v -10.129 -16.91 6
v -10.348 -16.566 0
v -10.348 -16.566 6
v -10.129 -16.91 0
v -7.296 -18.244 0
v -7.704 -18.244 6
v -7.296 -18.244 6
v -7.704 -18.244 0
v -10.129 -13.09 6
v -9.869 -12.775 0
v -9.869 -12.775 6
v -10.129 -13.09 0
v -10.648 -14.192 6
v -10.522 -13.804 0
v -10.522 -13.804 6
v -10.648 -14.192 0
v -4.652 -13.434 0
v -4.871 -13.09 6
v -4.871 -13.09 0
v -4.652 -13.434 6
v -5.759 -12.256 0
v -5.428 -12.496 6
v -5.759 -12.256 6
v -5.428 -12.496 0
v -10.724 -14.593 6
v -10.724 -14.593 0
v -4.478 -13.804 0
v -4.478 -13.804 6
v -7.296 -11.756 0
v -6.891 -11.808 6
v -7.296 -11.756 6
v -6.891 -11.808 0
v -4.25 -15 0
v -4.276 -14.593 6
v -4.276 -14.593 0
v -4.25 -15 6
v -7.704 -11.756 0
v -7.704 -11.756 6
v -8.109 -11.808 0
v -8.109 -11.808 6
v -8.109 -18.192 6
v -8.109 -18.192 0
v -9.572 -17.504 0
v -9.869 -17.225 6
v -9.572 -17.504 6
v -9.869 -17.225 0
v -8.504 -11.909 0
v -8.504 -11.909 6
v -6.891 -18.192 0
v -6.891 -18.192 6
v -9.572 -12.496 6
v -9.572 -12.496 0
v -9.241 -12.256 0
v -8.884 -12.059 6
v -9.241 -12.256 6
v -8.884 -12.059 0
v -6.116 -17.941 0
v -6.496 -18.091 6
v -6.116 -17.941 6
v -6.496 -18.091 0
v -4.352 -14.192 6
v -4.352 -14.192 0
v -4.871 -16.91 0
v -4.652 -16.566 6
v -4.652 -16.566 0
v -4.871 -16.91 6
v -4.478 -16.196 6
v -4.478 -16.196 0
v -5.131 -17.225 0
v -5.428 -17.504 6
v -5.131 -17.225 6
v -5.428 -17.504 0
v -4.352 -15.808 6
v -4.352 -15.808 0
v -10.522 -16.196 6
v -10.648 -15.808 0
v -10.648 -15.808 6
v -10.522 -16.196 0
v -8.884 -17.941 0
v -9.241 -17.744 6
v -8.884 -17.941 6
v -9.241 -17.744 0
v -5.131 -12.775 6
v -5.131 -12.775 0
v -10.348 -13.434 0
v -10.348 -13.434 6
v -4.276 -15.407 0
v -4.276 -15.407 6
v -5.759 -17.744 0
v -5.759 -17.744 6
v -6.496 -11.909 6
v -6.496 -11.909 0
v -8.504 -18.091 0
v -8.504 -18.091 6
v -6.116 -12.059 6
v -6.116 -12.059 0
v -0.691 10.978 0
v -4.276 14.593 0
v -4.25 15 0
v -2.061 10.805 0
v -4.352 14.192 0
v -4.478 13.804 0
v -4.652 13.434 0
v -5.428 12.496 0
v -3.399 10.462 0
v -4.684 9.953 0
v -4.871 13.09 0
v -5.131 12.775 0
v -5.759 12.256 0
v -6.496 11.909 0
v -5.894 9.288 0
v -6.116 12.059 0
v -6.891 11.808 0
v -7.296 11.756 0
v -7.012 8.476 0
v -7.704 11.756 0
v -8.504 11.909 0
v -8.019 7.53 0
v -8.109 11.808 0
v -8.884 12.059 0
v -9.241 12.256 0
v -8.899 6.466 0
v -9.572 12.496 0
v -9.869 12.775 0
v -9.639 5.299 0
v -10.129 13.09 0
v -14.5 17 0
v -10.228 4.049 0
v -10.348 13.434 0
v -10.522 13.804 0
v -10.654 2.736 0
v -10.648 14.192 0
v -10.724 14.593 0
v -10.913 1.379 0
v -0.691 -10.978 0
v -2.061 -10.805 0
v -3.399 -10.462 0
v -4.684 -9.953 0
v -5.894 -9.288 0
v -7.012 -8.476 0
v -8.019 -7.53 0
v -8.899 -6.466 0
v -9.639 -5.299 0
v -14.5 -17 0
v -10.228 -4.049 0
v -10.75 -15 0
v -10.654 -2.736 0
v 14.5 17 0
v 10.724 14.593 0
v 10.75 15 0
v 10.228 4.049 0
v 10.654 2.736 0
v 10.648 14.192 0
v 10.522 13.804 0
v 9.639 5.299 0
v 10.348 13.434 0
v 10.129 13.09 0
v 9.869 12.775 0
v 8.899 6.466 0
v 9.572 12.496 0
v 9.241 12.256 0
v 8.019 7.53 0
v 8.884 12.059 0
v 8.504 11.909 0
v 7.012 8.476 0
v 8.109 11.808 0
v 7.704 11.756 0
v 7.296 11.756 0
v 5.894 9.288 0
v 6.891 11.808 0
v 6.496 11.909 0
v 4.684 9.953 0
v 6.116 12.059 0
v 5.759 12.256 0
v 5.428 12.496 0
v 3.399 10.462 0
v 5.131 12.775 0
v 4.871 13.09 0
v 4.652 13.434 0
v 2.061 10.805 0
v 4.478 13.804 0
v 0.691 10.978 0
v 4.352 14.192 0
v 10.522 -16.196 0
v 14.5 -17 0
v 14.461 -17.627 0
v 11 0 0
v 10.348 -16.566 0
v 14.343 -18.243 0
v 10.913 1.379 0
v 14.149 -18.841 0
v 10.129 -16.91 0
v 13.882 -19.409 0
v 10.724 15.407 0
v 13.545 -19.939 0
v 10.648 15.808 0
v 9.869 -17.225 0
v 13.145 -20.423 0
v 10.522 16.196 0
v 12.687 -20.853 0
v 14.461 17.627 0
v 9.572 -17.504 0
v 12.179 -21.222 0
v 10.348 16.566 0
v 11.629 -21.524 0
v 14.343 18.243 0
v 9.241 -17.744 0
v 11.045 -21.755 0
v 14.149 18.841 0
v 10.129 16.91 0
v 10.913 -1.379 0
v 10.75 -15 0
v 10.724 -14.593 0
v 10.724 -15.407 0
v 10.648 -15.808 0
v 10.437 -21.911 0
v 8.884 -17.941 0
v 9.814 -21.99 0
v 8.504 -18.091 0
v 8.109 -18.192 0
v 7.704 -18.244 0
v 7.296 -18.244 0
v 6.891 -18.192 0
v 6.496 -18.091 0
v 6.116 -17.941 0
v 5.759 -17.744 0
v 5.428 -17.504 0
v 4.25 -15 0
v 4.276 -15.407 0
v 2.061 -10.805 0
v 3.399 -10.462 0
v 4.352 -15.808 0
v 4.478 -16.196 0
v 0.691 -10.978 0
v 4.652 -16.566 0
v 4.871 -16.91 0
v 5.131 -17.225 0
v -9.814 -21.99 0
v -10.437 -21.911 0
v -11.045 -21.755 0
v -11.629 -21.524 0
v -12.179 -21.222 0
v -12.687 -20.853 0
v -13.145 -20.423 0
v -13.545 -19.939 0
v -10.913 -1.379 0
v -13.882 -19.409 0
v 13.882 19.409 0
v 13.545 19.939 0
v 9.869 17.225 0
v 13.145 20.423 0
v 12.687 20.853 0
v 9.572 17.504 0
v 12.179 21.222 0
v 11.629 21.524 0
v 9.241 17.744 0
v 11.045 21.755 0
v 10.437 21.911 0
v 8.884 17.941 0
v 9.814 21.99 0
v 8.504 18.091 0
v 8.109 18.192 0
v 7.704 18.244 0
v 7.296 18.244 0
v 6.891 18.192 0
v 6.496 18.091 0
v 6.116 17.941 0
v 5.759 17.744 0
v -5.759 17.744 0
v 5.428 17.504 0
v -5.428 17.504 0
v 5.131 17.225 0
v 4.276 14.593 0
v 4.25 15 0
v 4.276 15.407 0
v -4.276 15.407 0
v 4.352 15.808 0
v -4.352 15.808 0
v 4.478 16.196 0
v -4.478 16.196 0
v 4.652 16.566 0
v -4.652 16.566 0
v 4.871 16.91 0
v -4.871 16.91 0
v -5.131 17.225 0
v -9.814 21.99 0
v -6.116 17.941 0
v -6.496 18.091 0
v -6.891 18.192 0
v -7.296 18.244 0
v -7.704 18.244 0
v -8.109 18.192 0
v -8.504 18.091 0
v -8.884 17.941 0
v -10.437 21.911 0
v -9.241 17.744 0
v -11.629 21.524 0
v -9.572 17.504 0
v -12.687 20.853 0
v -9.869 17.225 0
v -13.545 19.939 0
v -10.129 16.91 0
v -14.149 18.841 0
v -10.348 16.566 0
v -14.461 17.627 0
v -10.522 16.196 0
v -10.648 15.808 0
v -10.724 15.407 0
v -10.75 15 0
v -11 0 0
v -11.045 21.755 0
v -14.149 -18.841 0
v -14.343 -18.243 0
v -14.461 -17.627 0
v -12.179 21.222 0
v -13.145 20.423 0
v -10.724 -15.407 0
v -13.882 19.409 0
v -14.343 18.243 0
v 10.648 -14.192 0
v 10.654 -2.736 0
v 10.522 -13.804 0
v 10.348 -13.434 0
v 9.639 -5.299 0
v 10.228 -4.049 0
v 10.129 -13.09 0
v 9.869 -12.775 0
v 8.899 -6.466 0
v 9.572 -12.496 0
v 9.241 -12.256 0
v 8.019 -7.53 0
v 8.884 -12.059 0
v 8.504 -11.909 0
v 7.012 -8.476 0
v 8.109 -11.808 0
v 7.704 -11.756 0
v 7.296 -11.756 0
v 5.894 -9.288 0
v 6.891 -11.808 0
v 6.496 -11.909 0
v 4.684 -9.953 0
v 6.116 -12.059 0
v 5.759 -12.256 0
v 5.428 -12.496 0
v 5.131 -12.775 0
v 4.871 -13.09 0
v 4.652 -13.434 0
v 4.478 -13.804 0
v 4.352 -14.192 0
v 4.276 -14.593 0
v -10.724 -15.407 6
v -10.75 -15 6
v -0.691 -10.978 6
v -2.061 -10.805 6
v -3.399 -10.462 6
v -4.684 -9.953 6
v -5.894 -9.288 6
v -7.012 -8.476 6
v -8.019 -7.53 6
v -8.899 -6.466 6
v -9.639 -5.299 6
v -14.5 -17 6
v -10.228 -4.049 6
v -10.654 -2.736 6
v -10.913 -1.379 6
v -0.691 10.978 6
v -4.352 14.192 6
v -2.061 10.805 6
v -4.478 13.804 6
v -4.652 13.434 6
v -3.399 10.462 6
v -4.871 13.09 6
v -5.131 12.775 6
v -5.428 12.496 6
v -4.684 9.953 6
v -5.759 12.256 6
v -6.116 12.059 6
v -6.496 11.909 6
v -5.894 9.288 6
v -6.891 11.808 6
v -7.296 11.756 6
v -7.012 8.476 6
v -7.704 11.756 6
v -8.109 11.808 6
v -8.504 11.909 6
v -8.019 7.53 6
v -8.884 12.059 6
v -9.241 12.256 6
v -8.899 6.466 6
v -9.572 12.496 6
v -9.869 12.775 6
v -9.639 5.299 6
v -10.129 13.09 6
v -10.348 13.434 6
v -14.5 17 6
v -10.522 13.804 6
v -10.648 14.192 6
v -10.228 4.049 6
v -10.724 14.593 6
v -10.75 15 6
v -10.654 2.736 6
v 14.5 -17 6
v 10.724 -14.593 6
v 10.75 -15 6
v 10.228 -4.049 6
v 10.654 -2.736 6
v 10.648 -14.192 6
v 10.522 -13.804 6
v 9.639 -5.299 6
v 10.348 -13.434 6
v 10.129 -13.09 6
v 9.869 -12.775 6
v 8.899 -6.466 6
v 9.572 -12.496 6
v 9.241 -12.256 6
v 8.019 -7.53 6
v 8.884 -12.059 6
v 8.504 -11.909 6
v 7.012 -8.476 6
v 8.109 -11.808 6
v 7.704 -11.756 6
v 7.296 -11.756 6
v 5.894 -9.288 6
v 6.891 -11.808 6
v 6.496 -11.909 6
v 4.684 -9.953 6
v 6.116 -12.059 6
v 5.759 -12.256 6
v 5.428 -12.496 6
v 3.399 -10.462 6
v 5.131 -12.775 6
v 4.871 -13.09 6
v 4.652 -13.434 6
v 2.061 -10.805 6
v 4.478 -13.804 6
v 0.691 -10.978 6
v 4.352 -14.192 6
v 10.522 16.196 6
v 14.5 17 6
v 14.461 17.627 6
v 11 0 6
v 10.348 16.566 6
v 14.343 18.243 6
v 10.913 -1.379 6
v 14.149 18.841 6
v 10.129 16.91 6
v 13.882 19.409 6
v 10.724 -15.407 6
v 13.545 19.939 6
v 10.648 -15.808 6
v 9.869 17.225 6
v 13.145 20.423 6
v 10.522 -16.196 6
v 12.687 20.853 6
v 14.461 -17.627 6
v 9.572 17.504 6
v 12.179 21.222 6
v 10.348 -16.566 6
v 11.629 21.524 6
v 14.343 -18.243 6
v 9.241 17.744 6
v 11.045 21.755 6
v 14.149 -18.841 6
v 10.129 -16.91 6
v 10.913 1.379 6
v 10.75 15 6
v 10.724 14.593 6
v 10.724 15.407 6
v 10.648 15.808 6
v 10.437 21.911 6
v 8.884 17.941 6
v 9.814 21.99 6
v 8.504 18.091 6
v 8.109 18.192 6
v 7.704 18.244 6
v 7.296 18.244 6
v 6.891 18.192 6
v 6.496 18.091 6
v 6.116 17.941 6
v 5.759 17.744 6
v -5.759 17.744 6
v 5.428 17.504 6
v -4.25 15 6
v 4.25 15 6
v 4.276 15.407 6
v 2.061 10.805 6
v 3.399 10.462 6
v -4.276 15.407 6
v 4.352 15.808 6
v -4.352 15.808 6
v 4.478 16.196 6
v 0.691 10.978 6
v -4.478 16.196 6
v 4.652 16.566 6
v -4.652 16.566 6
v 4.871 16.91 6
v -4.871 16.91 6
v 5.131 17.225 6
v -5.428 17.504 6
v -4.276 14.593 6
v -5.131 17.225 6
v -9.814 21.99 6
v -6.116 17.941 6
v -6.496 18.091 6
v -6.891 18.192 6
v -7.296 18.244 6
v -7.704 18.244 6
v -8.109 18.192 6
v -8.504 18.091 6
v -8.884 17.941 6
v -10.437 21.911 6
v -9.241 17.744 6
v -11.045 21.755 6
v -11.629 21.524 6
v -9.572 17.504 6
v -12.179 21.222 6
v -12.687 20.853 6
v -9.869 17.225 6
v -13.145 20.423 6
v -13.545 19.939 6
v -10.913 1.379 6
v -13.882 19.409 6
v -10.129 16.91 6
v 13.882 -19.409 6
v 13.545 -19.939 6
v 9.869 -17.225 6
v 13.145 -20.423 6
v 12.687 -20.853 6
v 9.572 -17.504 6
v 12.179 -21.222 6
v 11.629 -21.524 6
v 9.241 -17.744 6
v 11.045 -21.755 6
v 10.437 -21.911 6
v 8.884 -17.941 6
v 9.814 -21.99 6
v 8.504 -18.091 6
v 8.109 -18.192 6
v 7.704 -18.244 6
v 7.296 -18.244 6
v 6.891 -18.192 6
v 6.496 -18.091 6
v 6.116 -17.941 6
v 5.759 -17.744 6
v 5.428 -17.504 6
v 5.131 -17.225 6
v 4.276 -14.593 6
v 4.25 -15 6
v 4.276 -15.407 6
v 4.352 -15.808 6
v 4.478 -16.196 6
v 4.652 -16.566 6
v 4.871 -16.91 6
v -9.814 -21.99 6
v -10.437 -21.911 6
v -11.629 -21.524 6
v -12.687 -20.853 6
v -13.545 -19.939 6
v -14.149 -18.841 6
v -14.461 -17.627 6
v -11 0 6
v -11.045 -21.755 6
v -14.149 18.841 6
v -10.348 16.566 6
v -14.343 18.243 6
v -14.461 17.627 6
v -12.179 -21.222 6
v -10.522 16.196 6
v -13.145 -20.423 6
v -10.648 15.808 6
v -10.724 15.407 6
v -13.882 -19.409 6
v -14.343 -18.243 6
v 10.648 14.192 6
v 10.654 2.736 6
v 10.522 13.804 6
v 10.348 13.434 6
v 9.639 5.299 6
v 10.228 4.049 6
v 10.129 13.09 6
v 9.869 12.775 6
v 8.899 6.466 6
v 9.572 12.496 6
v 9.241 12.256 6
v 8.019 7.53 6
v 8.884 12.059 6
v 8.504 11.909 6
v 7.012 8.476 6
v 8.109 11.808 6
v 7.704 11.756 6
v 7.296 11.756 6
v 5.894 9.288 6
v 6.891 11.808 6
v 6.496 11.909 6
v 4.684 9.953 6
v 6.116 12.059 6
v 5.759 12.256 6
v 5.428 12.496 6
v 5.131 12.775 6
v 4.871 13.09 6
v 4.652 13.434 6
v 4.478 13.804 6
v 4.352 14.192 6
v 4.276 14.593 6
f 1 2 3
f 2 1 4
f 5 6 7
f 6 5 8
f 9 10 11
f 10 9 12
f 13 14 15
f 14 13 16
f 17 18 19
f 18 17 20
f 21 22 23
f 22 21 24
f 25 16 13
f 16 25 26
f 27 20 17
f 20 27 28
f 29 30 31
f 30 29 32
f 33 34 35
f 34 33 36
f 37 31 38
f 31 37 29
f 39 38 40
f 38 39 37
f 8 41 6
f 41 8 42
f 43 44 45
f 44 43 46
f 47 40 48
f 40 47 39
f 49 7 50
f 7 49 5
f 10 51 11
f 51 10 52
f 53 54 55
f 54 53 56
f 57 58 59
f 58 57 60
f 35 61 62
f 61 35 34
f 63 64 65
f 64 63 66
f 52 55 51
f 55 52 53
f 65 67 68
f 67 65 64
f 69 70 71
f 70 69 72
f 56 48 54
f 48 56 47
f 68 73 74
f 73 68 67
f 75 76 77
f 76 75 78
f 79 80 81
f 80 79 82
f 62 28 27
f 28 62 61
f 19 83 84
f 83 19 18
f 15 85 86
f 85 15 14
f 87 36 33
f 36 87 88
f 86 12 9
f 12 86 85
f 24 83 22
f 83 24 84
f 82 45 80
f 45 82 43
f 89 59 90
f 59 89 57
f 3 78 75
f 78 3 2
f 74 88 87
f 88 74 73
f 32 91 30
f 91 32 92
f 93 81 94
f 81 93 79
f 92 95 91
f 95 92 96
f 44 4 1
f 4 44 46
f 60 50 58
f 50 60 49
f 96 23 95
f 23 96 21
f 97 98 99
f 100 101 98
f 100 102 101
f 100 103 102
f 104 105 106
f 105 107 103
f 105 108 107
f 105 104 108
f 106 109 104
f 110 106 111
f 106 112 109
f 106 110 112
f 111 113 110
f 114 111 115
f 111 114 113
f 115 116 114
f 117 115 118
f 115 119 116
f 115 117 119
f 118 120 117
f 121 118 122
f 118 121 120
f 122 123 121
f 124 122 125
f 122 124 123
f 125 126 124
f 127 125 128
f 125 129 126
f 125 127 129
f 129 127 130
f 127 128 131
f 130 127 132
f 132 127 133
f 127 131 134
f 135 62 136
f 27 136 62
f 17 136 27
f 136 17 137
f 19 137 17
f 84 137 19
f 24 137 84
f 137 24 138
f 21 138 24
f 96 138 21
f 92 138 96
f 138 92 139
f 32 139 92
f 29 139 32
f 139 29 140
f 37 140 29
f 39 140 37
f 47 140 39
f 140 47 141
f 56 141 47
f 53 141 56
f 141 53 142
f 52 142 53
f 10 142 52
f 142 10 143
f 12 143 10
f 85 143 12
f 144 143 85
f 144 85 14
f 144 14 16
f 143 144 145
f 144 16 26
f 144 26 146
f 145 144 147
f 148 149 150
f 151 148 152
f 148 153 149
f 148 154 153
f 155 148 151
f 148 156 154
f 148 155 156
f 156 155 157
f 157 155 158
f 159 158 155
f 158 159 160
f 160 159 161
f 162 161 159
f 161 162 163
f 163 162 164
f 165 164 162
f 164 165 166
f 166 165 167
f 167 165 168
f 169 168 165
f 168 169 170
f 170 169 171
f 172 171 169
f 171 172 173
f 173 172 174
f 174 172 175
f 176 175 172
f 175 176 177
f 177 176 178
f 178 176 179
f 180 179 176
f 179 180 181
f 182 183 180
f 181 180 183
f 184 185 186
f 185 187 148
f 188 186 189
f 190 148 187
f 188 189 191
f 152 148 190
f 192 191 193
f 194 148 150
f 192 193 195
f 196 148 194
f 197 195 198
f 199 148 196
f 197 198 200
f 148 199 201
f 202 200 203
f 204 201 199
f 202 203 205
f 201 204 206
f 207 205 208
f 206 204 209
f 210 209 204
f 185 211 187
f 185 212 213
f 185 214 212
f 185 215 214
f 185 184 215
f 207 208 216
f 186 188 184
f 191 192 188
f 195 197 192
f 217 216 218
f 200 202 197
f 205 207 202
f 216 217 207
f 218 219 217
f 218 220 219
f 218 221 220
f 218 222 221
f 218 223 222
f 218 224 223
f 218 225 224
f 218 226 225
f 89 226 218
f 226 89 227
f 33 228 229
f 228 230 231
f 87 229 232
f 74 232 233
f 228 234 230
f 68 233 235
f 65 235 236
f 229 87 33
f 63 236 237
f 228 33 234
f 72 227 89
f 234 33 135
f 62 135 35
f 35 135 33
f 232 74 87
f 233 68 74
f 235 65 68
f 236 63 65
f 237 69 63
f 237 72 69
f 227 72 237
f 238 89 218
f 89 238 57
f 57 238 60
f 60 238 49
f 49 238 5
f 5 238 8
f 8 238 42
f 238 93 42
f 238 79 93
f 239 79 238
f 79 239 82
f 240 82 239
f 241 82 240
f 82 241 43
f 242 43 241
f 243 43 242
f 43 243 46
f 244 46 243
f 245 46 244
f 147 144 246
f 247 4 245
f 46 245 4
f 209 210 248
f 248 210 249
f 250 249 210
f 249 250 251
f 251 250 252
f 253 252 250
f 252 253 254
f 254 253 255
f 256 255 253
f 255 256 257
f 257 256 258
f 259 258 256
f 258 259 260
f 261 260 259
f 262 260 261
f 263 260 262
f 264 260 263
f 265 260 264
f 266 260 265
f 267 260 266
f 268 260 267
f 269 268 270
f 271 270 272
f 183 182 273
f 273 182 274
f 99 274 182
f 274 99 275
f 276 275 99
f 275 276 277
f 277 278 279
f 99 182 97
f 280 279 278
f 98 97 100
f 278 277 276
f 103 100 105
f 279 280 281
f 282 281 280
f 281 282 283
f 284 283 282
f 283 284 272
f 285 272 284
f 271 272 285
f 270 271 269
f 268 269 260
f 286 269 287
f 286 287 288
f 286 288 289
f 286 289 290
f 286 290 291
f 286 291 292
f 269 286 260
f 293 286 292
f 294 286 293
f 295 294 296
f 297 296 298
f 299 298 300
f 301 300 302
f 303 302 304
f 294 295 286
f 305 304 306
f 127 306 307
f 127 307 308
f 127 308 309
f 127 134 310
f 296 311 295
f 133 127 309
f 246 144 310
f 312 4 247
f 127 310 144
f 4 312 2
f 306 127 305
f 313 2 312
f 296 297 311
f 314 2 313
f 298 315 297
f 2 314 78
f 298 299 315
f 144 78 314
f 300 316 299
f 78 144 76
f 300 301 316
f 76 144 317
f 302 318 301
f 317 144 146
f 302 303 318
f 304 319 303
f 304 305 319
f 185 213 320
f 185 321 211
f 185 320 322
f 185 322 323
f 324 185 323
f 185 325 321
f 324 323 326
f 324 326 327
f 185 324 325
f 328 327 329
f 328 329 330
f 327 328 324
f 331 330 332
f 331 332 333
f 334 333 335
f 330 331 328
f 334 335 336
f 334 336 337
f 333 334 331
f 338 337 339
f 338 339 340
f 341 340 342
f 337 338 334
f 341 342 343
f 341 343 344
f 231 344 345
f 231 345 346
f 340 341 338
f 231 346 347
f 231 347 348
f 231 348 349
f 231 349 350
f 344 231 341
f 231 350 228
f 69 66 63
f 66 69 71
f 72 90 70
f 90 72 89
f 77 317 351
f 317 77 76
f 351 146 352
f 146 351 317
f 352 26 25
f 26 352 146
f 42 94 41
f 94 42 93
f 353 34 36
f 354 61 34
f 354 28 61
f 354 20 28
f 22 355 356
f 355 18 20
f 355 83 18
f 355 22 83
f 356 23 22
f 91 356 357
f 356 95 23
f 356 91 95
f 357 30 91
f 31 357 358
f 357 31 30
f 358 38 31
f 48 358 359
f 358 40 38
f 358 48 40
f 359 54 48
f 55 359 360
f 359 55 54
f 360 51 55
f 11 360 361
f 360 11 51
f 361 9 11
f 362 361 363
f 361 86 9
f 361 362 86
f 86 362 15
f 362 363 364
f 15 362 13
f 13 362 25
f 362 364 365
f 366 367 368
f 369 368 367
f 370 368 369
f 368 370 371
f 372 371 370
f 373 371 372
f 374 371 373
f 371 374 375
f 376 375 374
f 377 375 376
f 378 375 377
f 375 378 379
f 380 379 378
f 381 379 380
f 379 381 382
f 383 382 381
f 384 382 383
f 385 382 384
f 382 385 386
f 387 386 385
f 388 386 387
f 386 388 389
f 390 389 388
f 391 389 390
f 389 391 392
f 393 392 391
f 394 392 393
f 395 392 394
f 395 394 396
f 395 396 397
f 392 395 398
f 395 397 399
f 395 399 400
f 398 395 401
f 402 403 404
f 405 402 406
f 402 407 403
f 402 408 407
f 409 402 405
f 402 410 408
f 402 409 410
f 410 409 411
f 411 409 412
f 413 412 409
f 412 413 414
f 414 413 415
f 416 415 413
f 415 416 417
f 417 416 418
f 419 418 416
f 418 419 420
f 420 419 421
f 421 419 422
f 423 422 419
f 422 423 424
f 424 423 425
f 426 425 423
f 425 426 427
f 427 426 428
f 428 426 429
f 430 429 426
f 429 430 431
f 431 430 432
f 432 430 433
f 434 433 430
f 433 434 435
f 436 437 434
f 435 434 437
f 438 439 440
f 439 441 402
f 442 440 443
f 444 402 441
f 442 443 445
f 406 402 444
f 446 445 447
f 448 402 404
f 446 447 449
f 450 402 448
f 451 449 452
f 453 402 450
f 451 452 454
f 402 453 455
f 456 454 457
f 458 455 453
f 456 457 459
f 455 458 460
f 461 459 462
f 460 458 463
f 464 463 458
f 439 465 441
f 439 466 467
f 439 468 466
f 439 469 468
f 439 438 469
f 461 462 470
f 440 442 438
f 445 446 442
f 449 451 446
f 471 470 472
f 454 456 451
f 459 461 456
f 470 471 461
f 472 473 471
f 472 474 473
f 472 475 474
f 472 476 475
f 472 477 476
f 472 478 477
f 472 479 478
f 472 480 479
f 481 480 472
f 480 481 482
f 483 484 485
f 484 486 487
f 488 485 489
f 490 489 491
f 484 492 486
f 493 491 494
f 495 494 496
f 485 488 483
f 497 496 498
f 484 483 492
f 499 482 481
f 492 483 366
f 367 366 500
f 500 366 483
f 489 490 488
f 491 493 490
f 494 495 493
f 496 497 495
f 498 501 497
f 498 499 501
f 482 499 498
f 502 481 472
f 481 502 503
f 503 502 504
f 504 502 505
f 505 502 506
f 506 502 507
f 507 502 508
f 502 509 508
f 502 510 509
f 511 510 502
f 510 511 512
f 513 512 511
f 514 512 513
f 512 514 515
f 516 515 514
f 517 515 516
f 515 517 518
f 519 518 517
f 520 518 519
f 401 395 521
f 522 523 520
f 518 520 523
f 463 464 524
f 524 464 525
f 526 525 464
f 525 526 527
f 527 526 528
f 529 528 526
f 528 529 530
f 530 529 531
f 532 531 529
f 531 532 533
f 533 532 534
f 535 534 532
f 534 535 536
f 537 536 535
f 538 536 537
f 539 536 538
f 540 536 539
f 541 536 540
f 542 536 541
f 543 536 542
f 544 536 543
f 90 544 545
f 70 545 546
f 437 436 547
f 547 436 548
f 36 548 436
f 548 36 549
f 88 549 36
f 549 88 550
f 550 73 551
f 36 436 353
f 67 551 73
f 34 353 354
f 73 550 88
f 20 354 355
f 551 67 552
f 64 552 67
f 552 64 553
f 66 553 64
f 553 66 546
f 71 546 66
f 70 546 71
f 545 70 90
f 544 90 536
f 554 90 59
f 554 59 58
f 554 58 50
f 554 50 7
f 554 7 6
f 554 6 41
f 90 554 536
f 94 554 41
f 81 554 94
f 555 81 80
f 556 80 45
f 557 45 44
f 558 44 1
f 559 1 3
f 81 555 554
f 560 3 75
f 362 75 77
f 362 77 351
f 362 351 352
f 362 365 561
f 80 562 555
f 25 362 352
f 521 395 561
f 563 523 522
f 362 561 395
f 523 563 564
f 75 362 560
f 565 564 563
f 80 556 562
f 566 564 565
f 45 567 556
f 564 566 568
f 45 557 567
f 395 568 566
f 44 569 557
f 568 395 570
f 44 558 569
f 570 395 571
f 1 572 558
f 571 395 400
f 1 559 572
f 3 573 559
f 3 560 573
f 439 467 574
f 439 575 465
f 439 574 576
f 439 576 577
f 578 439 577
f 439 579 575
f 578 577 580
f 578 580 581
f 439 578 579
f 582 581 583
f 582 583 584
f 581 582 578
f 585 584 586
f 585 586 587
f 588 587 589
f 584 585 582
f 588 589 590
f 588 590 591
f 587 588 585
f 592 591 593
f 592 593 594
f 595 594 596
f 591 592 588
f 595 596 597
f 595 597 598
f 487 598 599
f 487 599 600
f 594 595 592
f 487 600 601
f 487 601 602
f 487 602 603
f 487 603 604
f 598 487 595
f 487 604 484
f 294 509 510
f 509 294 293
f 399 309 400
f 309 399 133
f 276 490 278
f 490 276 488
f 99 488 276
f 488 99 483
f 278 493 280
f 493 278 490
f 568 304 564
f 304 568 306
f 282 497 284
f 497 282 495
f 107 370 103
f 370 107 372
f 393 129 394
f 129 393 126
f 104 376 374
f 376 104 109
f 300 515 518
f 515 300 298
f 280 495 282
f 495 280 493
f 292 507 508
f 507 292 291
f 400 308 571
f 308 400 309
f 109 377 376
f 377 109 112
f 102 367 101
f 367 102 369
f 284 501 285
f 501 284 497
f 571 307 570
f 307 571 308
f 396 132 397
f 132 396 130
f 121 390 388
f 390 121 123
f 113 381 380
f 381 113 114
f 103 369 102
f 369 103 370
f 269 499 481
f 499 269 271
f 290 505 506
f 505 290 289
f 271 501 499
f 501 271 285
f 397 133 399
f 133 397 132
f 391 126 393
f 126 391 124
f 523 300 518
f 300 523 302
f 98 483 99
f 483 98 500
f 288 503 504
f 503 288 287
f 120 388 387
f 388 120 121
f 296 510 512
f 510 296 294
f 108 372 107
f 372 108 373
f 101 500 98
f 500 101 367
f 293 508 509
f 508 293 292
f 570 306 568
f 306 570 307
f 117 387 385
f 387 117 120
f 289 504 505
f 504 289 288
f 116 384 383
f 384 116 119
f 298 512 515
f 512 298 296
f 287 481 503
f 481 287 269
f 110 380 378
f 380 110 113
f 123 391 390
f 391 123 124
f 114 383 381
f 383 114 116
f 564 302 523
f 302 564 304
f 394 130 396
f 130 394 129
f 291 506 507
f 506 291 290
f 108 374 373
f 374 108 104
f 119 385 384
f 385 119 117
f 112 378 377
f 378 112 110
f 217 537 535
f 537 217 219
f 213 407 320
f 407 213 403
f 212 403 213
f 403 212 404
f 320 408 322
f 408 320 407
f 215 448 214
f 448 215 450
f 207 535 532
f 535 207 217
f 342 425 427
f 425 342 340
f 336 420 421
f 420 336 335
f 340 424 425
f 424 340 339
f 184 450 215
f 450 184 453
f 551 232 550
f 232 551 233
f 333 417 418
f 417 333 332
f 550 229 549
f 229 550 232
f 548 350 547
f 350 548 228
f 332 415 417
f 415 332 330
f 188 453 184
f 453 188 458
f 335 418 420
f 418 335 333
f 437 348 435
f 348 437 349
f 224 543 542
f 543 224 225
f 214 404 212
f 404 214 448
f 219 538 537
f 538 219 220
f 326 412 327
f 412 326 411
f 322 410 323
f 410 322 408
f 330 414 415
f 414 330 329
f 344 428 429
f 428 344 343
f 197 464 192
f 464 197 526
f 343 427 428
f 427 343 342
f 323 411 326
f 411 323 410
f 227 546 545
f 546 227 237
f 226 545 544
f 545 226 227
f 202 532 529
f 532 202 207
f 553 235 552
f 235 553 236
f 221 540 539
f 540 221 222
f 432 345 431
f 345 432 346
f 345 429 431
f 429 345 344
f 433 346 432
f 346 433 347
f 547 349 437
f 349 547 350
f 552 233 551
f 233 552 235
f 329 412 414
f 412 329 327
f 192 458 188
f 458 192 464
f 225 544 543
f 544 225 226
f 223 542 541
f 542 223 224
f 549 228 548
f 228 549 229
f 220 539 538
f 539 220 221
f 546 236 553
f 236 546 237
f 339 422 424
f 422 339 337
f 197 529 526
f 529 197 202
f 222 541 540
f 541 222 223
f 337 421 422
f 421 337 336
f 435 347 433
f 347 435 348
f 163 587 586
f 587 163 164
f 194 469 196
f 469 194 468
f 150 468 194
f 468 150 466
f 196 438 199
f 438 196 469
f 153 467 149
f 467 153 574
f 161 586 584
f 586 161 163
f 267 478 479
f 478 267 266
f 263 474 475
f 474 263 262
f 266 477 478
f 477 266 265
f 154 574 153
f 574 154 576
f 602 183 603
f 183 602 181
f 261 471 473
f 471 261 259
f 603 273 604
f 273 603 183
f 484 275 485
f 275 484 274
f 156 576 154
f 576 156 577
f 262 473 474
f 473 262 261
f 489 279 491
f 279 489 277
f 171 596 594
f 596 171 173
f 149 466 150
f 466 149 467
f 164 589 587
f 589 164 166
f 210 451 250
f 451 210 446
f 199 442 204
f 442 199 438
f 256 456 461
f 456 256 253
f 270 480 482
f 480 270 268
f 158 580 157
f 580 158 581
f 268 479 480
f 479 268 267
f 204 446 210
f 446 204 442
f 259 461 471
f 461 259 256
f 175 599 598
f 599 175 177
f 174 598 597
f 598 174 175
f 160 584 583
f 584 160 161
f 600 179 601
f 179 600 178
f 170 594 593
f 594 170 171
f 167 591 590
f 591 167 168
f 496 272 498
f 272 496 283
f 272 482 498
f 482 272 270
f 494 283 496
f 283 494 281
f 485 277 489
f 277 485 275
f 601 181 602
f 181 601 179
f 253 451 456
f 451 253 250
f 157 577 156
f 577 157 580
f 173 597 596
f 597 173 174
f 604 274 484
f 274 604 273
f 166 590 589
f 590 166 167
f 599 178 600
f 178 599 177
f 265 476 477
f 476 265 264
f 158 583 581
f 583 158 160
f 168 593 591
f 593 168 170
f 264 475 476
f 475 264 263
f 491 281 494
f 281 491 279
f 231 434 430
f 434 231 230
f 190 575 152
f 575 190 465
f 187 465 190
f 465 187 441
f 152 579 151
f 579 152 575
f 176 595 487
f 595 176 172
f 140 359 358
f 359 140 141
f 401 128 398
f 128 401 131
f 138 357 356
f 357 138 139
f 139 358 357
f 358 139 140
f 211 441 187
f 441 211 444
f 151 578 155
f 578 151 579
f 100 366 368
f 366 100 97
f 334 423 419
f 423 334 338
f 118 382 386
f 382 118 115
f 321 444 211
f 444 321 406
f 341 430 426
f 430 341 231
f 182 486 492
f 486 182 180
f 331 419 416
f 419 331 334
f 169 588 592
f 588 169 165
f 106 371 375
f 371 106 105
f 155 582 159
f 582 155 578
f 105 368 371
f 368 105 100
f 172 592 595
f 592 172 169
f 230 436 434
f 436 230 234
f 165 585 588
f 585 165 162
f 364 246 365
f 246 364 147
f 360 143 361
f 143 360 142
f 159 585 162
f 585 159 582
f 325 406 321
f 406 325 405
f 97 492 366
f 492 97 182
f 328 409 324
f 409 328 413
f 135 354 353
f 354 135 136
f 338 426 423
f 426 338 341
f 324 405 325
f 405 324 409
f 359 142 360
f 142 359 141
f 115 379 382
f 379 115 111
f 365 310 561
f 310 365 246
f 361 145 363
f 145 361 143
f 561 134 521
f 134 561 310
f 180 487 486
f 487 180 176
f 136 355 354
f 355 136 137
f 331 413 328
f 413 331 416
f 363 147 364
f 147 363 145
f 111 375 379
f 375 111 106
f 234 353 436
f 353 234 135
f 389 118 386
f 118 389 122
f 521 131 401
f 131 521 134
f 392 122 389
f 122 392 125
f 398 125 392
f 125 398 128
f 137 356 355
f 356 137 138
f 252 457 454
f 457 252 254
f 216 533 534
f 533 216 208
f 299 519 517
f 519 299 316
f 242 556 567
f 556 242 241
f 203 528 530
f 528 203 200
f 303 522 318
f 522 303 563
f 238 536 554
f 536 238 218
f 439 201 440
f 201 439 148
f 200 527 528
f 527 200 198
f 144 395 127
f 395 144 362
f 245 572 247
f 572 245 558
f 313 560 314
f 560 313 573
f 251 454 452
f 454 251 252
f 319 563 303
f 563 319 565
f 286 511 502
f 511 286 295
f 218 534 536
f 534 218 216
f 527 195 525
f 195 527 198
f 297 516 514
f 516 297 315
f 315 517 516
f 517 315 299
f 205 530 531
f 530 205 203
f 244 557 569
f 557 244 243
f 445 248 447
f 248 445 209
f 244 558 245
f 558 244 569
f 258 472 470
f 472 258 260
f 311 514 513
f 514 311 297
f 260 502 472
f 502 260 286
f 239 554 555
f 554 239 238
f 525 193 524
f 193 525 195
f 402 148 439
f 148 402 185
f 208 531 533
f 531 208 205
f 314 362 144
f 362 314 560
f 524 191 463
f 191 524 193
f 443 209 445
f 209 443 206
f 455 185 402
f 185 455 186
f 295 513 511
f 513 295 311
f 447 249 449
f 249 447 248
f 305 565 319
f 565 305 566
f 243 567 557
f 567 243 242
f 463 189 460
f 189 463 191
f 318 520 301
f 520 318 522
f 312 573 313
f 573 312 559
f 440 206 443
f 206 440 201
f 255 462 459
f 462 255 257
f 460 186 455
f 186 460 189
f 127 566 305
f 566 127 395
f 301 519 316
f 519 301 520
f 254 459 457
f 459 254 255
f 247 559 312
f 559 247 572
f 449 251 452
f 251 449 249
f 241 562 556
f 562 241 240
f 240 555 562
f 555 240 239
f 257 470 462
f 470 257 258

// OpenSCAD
$fn = 50;

difference() {
	union() {
		hull() {
			translate(v = [-9.5, 17.0, 0]) {
				cylinder(h = 6, r = 5);
			}
			translate(v = [9.5, 17.0, 0]) {
				cylinder(h = 6, r = 5);
			}
			translate(v = [-9.5, -17.0, 0]) {
				cylinder(h = 6, r = 5);
			}
			translate(v = [9.5, -17.0, 0]) {
				cylinder(h = 6, r = 5);
			}
		}
	}
	union() {
		translate(v = [-7.5, -15.0, 0]) {
			cylinder(h = 6, r = 3.25);
		}
		translate(v = [-7.5, 15.0, 0]) {
			cylinder(h = 6, r = 3.25);
		}
		translate(v = [7.5, -15.0, 0]) {
			cylinder(h = 6, r = 3.25);
		}
		translate(v = [7.5, 15.0, 0]) {
			cylinder(h = 6, r = 3.25);
		}
		cylinder(h = 6, r = 11.0);
	}
}
